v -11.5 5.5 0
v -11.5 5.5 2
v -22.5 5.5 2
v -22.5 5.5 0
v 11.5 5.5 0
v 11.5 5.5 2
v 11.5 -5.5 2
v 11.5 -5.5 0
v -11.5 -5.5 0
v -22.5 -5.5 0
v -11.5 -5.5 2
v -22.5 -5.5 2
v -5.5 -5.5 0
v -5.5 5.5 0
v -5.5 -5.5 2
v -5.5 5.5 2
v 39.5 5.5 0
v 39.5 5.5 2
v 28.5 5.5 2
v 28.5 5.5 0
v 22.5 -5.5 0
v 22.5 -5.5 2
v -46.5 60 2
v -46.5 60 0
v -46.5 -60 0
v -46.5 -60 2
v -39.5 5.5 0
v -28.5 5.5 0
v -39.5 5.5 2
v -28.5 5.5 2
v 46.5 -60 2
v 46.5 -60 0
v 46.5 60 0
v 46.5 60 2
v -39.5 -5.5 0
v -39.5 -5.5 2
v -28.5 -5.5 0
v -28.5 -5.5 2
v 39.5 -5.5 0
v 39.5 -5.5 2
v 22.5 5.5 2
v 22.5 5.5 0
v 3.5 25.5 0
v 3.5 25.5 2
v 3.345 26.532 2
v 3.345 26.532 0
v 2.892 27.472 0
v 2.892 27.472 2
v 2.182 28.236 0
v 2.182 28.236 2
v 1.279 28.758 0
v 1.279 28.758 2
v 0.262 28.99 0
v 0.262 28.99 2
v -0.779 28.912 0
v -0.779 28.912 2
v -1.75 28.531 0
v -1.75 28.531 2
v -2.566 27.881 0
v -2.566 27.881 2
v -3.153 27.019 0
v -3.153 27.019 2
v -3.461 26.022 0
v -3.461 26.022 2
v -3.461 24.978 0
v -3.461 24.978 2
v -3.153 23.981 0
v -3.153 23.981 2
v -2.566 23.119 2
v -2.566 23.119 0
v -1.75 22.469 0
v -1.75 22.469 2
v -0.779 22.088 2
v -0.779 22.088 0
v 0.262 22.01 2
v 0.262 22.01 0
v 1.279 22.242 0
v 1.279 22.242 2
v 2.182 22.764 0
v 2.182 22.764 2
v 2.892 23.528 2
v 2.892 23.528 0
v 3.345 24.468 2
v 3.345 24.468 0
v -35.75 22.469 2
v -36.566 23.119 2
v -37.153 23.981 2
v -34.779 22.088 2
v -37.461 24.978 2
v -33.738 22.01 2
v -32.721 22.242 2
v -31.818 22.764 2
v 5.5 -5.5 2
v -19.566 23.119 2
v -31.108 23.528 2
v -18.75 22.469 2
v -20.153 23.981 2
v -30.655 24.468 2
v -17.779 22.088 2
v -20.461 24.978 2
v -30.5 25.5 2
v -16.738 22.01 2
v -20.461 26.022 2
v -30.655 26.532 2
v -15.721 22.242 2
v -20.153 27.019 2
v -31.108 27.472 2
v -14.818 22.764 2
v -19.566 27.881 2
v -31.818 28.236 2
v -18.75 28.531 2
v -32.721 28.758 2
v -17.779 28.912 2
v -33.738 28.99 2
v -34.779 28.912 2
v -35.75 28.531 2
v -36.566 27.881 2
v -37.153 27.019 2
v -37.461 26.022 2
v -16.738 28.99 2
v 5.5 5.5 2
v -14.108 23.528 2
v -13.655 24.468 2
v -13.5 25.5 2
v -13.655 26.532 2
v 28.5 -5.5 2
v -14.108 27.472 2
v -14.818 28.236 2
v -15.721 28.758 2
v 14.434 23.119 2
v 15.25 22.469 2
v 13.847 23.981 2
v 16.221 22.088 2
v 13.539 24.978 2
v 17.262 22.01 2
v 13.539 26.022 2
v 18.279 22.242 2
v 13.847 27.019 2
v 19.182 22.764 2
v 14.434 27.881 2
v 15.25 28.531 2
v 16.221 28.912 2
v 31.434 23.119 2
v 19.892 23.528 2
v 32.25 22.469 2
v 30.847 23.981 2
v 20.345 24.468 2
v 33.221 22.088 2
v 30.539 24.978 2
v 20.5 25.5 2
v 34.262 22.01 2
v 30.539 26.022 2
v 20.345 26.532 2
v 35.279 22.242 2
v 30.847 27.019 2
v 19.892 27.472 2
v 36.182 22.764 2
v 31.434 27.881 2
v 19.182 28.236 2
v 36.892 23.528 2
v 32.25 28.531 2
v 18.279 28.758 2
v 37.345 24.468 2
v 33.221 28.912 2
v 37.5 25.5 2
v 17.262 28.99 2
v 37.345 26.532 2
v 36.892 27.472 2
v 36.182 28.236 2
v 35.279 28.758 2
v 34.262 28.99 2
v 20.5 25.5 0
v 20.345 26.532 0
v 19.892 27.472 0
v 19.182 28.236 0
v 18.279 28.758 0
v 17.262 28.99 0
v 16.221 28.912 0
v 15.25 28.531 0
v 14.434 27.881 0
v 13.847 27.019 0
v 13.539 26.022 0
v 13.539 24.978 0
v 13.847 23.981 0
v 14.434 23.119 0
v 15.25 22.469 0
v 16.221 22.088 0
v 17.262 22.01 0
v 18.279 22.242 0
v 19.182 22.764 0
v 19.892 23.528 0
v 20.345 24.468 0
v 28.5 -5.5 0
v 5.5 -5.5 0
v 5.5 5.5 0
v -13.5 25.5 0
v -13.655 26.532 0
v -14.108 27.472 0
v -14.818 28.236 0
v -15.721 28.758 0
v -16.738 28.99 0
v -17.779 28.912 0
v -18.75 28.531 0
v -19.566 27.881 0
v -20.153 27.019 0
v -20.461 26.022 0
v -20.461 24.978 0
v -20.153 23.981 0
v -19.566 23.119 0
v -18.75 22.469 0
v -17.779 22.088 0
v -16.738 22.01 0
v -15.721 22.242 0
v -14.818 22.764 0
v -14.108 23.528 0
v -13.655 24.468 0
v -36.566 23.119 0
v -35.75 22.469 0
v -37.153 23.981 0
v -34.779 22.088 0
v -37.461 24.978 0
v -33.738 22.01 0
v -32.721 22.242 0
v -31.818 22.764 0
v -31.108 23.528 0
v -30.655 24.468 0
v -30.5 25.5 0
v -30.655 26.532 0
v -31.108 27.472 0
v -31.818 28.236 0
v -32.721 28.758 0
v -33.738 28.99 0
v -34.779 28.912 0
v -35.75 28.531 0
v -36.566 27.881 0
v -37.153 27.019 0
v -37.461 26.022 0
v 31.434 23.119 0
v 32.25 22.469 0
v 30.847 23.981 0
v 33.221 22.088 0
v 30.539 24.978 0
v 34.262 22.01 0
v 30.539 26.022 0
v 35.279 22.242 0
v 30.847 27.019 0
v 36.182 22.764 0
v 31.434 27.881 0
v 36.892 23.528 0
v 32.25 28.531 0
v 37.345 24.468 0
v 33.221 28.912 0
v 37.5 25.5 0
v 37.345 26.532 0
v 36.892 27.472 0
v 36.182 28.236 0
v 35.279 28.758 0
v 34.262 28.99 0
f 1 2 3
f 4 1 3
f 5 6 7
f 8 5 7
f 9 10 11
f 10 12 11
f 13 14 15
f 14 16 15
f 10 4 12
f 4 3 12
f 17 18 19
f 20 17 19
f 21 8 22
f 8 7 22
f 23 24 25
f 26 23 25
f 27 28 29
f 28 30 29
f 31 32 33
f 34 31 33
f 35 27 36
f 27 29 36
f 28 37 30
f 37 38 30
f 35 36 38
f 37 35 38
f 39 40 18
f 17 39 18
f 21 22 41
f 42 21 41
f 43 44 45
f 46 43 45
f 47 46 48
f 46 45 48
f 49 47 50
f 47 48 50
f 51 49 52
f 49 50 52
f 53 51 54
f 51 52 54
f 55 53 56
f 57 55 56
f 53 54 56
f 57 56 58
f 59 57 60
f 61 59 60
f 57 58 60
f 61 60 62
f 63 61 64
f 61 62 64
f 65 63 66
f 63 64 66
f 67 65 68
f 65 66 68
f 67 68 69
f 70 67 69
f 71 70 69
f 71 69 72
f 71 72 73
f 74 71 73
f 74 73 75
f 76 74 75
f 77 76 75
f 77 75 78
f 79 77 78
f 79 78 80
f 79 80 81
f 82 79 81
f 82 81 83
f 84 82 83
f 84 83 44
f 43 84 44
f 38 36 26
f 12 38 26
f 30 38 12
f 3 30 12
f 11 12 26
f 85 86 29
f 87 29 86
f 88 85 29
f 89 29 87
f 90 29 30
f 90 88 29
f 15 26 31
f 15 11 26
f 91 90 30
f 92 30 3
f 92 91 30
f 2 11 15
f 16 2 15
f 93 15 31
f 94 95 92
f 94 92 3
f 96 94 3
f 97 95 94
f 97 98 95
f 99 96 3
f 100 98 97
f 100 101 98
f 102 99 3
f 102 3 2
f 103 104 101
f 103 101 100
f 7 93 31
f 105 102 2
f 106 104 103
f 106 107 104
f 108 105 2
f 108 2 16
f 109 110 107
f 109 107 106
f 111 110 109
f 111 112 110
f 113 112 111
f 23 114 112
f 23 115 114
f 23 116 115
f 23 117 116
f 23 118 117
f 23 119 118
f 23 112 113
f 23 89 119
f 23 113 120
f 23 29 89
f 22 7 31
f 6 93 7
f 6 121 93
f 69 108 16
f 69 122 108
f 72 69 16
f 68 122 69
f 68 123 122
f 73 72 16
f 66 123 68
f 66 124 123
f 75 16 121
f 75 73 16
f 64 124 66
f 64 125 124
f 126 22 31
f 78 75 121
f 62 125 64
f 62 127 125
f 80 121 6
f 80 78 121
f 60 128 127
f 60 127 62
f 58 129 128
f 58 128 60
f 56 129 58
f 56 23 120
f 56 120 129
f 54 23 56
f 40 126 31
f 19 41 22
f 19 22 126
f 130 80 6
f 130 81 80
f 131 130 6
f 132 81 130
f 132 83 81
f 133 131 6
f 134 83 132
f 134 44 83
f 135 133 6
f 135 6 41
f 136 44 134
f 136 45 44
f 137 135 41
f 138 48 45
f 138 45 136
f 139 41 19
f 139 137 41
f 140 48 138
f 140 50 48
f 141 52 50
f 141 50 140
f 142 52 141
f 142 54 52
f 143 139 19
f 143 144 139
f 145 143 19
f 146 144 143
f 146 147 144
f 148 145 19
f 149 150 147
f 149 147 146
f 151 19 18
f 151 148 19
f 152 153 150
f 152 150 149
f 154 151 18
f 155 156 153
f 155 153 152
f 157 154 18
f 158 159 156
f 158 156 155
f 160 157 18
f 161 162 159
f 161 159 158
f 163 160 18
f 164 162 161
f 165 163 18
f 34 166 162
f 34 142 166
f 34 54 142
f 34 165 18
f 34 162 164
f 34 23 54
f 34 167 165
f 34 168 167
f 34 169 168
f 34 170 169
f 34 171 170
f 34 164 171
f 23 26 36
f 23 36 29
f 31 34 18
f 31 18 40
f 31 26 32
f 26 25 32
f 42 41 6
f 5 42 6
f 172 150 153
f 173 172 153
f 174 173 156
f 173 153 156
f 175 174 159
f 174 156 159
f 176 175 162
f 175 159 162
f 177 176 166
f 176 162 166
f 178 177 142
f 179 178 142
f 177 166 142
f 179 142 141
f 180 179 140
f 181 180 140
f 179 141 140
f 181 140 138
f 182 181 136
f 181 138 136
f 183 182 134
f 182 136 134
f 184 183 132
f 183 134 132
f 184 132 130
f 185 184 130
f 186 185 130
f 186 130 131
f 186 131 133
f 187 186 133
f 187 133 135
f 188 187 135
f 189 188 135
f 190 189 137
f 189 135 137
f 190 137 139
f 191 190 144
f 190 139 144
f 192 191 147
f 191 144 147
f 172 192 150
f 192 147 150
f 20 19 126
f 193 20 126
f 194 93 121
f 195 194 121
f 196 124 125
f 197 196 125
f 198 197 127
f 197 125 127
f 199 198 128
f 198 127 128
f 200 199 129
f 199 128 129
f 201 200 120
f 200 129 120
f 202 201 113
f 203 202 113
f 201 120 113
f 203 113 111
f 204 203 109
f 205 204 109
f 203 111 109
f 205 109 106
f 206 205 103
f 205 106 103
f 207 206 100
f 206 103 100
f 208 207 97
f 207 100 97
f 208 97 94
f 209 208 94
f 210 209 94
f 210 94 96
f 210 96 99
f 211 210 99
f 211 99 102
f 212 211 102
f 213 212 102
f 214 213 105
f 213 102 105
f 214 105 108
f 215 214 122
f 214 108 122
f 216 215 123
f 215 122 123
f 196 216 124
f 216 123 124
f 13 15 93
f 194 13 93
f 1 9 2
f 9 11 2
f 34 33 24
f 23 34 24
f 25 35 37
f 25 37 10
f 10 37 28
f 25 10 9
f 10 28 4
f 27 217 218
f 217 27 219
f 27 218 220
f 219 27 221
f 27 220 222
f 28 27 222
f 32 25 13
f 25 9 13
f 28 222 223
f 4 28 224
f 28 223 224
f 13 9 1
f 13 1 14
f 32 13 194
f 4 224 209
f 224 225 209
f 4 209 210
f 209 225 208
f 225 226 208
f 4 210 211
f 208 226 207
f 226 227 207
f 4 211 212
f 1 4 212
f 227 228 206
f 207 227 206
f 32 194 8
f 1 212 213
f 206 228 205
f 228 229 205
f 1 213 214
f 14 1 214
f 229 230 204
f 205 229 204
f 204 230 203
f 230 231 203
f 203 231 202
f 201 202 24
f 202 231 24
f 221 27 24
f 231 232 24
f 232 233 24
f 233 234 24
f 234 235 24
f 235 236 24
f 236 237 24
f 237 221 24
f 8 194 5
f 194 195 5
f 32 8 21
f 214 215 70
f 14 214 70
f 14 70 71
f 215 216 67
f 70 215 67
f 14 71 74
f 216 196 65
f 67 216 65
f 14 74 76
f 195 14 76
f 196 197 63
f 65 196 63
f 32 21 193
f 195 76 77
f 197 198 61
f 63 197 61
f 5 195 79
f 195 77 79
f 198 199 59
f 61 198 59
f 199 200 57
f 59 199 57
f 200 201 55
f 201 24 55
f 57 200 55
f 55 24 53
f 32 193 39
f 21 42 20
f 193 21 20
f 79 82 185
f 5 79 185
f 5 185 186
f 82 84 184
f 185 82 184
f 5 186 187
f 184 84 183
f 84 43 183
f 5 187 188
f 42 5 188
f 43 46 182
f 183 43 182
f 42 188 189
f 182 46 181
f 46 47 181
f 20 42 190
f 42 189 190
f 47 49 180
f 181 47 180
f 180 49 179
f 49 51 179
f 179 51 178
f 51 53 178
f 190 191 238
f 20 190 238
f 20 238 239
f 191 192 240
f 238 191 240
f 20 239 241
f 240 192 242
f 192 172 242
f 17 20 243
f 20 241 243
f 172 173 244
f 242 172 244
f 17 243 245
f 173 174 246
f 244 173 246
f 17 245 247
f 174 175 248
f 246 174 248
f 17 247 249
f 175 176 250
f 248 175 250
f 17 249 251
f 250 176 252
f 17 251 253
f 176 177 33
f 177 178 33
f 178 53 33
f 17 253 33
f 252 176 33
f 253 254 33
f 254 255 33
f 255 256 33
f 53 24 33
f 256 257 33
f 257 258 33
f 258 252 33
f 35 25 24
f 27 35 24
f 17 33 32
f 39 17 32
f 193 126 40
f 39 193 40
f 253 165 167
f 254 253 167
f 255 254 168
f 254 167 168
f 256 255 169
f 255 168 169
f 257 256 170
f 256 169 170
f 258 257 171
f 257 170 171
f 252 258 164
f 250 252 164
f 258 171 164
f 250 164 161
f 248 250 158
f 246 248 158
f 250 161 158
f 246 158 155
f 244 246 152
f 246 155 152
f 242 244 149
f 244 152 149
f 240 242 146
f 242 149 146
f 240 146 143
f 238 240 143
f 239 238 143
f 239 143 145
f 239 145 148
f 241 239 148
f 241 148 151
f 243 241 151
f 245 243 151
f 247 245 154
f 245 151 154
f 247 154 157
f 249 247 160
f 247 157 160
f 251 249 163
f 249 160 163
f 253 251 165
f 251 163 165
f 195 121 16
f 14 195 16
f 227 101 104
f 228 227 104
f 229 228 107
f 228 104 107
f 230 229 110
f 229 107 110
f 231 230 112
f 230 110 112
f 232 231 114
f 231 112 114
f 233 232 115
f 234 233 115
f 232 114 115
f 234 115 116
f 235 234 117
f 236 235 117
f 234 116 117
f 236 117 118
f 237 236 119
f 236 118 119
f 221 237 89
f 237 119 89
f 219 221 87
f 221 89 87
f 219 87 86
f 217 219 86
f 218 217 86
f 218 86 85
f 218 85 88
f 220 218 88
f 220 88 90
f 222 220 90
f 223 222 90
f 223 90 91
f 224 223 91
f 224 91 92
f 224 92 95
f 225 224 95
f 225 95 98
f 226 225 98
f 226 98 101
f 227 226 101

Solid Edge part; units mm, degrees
sketch "Sketch1" plane through (0, 0, 0) normal (0, 0, 1) x (1, 0, 0)
  line L0 (46.5, -60) -> (46.5, 60)
  line L1 (46.5, 60) -> (-46.5, 60)
  line L2 (-46.5, 60) -> (-46.5, -60)
  line L3 (-46.5, -60) -> (46.5, -60)
extrude "Protrusion1" add sketch "Sketch1" along normal blind 2
sketch "Sketch2" plane through (0, 0, 2) normal (0, 0, 1) x (1, 0, 0)
  circle A0 centre (-34, 25.5) radius 3.5
  line L0 (-28.5, 5.5) -> (-39.5, 5.5)
  line L1 (-39.5, 5.5) -> (-39.5, -5.5)
  line L2 (-39.5, -5.5) -> (-28.5, -5.5)
  line L3 (-28.5, -5.5) -> (-28.5, 5.5)
  circle A1 centre (-17, 25.5) radius 3.5
  line L4 (-11.5, 5.5) -> (-22.5, 5.5)
  line L5 (-22.5, 5.5) -> (-22.5, -5.5)
  line L6 (-22.5, -5.5) -> (-11.5, -5.5)
  line L7 (-11.5, -5.5) -> (-11.5, 5.5)
  circle A2 centre (0, 25.5) radius 3.5
  line L8 (5.5, 5.5) -> (-5.5, 5.5)
  line L9 (-5.5, 5.5) -> (-5.5, -5.5)
  line L10 (-5.5, -5.5) -> (5.5, -5.5)
  line L11 (5.5, -5.5) -> (5.5, 5.5)
  circle A3 centre (17, 25.5) radius 3.5
  line L12 (22.5, 5.5) -> (11.5, 5.5)
  line L13 (11.5, 5.5) -> (11.5, -5.5)
  line L14 (11.5, -5.5) -> (22.5, -5.5)
  line L15 (22.5, -5.5) -> (22.5, 5.5)
  circle A4 centre (34, 25.5) radius 3.5
  line L16 (39.5, 5.5) -> (28.5, 5.5)
  line L17 (28.5, 5.5) -> (28.5, -5.5)
  line L18 (28.5, -5.5) -> (39.5, -5.5)
  line L19 (39.5, -5.5) -> (39.5, 5.5)
extrude "Cutout1" cut sketch "Sketch2" against normal up to next
